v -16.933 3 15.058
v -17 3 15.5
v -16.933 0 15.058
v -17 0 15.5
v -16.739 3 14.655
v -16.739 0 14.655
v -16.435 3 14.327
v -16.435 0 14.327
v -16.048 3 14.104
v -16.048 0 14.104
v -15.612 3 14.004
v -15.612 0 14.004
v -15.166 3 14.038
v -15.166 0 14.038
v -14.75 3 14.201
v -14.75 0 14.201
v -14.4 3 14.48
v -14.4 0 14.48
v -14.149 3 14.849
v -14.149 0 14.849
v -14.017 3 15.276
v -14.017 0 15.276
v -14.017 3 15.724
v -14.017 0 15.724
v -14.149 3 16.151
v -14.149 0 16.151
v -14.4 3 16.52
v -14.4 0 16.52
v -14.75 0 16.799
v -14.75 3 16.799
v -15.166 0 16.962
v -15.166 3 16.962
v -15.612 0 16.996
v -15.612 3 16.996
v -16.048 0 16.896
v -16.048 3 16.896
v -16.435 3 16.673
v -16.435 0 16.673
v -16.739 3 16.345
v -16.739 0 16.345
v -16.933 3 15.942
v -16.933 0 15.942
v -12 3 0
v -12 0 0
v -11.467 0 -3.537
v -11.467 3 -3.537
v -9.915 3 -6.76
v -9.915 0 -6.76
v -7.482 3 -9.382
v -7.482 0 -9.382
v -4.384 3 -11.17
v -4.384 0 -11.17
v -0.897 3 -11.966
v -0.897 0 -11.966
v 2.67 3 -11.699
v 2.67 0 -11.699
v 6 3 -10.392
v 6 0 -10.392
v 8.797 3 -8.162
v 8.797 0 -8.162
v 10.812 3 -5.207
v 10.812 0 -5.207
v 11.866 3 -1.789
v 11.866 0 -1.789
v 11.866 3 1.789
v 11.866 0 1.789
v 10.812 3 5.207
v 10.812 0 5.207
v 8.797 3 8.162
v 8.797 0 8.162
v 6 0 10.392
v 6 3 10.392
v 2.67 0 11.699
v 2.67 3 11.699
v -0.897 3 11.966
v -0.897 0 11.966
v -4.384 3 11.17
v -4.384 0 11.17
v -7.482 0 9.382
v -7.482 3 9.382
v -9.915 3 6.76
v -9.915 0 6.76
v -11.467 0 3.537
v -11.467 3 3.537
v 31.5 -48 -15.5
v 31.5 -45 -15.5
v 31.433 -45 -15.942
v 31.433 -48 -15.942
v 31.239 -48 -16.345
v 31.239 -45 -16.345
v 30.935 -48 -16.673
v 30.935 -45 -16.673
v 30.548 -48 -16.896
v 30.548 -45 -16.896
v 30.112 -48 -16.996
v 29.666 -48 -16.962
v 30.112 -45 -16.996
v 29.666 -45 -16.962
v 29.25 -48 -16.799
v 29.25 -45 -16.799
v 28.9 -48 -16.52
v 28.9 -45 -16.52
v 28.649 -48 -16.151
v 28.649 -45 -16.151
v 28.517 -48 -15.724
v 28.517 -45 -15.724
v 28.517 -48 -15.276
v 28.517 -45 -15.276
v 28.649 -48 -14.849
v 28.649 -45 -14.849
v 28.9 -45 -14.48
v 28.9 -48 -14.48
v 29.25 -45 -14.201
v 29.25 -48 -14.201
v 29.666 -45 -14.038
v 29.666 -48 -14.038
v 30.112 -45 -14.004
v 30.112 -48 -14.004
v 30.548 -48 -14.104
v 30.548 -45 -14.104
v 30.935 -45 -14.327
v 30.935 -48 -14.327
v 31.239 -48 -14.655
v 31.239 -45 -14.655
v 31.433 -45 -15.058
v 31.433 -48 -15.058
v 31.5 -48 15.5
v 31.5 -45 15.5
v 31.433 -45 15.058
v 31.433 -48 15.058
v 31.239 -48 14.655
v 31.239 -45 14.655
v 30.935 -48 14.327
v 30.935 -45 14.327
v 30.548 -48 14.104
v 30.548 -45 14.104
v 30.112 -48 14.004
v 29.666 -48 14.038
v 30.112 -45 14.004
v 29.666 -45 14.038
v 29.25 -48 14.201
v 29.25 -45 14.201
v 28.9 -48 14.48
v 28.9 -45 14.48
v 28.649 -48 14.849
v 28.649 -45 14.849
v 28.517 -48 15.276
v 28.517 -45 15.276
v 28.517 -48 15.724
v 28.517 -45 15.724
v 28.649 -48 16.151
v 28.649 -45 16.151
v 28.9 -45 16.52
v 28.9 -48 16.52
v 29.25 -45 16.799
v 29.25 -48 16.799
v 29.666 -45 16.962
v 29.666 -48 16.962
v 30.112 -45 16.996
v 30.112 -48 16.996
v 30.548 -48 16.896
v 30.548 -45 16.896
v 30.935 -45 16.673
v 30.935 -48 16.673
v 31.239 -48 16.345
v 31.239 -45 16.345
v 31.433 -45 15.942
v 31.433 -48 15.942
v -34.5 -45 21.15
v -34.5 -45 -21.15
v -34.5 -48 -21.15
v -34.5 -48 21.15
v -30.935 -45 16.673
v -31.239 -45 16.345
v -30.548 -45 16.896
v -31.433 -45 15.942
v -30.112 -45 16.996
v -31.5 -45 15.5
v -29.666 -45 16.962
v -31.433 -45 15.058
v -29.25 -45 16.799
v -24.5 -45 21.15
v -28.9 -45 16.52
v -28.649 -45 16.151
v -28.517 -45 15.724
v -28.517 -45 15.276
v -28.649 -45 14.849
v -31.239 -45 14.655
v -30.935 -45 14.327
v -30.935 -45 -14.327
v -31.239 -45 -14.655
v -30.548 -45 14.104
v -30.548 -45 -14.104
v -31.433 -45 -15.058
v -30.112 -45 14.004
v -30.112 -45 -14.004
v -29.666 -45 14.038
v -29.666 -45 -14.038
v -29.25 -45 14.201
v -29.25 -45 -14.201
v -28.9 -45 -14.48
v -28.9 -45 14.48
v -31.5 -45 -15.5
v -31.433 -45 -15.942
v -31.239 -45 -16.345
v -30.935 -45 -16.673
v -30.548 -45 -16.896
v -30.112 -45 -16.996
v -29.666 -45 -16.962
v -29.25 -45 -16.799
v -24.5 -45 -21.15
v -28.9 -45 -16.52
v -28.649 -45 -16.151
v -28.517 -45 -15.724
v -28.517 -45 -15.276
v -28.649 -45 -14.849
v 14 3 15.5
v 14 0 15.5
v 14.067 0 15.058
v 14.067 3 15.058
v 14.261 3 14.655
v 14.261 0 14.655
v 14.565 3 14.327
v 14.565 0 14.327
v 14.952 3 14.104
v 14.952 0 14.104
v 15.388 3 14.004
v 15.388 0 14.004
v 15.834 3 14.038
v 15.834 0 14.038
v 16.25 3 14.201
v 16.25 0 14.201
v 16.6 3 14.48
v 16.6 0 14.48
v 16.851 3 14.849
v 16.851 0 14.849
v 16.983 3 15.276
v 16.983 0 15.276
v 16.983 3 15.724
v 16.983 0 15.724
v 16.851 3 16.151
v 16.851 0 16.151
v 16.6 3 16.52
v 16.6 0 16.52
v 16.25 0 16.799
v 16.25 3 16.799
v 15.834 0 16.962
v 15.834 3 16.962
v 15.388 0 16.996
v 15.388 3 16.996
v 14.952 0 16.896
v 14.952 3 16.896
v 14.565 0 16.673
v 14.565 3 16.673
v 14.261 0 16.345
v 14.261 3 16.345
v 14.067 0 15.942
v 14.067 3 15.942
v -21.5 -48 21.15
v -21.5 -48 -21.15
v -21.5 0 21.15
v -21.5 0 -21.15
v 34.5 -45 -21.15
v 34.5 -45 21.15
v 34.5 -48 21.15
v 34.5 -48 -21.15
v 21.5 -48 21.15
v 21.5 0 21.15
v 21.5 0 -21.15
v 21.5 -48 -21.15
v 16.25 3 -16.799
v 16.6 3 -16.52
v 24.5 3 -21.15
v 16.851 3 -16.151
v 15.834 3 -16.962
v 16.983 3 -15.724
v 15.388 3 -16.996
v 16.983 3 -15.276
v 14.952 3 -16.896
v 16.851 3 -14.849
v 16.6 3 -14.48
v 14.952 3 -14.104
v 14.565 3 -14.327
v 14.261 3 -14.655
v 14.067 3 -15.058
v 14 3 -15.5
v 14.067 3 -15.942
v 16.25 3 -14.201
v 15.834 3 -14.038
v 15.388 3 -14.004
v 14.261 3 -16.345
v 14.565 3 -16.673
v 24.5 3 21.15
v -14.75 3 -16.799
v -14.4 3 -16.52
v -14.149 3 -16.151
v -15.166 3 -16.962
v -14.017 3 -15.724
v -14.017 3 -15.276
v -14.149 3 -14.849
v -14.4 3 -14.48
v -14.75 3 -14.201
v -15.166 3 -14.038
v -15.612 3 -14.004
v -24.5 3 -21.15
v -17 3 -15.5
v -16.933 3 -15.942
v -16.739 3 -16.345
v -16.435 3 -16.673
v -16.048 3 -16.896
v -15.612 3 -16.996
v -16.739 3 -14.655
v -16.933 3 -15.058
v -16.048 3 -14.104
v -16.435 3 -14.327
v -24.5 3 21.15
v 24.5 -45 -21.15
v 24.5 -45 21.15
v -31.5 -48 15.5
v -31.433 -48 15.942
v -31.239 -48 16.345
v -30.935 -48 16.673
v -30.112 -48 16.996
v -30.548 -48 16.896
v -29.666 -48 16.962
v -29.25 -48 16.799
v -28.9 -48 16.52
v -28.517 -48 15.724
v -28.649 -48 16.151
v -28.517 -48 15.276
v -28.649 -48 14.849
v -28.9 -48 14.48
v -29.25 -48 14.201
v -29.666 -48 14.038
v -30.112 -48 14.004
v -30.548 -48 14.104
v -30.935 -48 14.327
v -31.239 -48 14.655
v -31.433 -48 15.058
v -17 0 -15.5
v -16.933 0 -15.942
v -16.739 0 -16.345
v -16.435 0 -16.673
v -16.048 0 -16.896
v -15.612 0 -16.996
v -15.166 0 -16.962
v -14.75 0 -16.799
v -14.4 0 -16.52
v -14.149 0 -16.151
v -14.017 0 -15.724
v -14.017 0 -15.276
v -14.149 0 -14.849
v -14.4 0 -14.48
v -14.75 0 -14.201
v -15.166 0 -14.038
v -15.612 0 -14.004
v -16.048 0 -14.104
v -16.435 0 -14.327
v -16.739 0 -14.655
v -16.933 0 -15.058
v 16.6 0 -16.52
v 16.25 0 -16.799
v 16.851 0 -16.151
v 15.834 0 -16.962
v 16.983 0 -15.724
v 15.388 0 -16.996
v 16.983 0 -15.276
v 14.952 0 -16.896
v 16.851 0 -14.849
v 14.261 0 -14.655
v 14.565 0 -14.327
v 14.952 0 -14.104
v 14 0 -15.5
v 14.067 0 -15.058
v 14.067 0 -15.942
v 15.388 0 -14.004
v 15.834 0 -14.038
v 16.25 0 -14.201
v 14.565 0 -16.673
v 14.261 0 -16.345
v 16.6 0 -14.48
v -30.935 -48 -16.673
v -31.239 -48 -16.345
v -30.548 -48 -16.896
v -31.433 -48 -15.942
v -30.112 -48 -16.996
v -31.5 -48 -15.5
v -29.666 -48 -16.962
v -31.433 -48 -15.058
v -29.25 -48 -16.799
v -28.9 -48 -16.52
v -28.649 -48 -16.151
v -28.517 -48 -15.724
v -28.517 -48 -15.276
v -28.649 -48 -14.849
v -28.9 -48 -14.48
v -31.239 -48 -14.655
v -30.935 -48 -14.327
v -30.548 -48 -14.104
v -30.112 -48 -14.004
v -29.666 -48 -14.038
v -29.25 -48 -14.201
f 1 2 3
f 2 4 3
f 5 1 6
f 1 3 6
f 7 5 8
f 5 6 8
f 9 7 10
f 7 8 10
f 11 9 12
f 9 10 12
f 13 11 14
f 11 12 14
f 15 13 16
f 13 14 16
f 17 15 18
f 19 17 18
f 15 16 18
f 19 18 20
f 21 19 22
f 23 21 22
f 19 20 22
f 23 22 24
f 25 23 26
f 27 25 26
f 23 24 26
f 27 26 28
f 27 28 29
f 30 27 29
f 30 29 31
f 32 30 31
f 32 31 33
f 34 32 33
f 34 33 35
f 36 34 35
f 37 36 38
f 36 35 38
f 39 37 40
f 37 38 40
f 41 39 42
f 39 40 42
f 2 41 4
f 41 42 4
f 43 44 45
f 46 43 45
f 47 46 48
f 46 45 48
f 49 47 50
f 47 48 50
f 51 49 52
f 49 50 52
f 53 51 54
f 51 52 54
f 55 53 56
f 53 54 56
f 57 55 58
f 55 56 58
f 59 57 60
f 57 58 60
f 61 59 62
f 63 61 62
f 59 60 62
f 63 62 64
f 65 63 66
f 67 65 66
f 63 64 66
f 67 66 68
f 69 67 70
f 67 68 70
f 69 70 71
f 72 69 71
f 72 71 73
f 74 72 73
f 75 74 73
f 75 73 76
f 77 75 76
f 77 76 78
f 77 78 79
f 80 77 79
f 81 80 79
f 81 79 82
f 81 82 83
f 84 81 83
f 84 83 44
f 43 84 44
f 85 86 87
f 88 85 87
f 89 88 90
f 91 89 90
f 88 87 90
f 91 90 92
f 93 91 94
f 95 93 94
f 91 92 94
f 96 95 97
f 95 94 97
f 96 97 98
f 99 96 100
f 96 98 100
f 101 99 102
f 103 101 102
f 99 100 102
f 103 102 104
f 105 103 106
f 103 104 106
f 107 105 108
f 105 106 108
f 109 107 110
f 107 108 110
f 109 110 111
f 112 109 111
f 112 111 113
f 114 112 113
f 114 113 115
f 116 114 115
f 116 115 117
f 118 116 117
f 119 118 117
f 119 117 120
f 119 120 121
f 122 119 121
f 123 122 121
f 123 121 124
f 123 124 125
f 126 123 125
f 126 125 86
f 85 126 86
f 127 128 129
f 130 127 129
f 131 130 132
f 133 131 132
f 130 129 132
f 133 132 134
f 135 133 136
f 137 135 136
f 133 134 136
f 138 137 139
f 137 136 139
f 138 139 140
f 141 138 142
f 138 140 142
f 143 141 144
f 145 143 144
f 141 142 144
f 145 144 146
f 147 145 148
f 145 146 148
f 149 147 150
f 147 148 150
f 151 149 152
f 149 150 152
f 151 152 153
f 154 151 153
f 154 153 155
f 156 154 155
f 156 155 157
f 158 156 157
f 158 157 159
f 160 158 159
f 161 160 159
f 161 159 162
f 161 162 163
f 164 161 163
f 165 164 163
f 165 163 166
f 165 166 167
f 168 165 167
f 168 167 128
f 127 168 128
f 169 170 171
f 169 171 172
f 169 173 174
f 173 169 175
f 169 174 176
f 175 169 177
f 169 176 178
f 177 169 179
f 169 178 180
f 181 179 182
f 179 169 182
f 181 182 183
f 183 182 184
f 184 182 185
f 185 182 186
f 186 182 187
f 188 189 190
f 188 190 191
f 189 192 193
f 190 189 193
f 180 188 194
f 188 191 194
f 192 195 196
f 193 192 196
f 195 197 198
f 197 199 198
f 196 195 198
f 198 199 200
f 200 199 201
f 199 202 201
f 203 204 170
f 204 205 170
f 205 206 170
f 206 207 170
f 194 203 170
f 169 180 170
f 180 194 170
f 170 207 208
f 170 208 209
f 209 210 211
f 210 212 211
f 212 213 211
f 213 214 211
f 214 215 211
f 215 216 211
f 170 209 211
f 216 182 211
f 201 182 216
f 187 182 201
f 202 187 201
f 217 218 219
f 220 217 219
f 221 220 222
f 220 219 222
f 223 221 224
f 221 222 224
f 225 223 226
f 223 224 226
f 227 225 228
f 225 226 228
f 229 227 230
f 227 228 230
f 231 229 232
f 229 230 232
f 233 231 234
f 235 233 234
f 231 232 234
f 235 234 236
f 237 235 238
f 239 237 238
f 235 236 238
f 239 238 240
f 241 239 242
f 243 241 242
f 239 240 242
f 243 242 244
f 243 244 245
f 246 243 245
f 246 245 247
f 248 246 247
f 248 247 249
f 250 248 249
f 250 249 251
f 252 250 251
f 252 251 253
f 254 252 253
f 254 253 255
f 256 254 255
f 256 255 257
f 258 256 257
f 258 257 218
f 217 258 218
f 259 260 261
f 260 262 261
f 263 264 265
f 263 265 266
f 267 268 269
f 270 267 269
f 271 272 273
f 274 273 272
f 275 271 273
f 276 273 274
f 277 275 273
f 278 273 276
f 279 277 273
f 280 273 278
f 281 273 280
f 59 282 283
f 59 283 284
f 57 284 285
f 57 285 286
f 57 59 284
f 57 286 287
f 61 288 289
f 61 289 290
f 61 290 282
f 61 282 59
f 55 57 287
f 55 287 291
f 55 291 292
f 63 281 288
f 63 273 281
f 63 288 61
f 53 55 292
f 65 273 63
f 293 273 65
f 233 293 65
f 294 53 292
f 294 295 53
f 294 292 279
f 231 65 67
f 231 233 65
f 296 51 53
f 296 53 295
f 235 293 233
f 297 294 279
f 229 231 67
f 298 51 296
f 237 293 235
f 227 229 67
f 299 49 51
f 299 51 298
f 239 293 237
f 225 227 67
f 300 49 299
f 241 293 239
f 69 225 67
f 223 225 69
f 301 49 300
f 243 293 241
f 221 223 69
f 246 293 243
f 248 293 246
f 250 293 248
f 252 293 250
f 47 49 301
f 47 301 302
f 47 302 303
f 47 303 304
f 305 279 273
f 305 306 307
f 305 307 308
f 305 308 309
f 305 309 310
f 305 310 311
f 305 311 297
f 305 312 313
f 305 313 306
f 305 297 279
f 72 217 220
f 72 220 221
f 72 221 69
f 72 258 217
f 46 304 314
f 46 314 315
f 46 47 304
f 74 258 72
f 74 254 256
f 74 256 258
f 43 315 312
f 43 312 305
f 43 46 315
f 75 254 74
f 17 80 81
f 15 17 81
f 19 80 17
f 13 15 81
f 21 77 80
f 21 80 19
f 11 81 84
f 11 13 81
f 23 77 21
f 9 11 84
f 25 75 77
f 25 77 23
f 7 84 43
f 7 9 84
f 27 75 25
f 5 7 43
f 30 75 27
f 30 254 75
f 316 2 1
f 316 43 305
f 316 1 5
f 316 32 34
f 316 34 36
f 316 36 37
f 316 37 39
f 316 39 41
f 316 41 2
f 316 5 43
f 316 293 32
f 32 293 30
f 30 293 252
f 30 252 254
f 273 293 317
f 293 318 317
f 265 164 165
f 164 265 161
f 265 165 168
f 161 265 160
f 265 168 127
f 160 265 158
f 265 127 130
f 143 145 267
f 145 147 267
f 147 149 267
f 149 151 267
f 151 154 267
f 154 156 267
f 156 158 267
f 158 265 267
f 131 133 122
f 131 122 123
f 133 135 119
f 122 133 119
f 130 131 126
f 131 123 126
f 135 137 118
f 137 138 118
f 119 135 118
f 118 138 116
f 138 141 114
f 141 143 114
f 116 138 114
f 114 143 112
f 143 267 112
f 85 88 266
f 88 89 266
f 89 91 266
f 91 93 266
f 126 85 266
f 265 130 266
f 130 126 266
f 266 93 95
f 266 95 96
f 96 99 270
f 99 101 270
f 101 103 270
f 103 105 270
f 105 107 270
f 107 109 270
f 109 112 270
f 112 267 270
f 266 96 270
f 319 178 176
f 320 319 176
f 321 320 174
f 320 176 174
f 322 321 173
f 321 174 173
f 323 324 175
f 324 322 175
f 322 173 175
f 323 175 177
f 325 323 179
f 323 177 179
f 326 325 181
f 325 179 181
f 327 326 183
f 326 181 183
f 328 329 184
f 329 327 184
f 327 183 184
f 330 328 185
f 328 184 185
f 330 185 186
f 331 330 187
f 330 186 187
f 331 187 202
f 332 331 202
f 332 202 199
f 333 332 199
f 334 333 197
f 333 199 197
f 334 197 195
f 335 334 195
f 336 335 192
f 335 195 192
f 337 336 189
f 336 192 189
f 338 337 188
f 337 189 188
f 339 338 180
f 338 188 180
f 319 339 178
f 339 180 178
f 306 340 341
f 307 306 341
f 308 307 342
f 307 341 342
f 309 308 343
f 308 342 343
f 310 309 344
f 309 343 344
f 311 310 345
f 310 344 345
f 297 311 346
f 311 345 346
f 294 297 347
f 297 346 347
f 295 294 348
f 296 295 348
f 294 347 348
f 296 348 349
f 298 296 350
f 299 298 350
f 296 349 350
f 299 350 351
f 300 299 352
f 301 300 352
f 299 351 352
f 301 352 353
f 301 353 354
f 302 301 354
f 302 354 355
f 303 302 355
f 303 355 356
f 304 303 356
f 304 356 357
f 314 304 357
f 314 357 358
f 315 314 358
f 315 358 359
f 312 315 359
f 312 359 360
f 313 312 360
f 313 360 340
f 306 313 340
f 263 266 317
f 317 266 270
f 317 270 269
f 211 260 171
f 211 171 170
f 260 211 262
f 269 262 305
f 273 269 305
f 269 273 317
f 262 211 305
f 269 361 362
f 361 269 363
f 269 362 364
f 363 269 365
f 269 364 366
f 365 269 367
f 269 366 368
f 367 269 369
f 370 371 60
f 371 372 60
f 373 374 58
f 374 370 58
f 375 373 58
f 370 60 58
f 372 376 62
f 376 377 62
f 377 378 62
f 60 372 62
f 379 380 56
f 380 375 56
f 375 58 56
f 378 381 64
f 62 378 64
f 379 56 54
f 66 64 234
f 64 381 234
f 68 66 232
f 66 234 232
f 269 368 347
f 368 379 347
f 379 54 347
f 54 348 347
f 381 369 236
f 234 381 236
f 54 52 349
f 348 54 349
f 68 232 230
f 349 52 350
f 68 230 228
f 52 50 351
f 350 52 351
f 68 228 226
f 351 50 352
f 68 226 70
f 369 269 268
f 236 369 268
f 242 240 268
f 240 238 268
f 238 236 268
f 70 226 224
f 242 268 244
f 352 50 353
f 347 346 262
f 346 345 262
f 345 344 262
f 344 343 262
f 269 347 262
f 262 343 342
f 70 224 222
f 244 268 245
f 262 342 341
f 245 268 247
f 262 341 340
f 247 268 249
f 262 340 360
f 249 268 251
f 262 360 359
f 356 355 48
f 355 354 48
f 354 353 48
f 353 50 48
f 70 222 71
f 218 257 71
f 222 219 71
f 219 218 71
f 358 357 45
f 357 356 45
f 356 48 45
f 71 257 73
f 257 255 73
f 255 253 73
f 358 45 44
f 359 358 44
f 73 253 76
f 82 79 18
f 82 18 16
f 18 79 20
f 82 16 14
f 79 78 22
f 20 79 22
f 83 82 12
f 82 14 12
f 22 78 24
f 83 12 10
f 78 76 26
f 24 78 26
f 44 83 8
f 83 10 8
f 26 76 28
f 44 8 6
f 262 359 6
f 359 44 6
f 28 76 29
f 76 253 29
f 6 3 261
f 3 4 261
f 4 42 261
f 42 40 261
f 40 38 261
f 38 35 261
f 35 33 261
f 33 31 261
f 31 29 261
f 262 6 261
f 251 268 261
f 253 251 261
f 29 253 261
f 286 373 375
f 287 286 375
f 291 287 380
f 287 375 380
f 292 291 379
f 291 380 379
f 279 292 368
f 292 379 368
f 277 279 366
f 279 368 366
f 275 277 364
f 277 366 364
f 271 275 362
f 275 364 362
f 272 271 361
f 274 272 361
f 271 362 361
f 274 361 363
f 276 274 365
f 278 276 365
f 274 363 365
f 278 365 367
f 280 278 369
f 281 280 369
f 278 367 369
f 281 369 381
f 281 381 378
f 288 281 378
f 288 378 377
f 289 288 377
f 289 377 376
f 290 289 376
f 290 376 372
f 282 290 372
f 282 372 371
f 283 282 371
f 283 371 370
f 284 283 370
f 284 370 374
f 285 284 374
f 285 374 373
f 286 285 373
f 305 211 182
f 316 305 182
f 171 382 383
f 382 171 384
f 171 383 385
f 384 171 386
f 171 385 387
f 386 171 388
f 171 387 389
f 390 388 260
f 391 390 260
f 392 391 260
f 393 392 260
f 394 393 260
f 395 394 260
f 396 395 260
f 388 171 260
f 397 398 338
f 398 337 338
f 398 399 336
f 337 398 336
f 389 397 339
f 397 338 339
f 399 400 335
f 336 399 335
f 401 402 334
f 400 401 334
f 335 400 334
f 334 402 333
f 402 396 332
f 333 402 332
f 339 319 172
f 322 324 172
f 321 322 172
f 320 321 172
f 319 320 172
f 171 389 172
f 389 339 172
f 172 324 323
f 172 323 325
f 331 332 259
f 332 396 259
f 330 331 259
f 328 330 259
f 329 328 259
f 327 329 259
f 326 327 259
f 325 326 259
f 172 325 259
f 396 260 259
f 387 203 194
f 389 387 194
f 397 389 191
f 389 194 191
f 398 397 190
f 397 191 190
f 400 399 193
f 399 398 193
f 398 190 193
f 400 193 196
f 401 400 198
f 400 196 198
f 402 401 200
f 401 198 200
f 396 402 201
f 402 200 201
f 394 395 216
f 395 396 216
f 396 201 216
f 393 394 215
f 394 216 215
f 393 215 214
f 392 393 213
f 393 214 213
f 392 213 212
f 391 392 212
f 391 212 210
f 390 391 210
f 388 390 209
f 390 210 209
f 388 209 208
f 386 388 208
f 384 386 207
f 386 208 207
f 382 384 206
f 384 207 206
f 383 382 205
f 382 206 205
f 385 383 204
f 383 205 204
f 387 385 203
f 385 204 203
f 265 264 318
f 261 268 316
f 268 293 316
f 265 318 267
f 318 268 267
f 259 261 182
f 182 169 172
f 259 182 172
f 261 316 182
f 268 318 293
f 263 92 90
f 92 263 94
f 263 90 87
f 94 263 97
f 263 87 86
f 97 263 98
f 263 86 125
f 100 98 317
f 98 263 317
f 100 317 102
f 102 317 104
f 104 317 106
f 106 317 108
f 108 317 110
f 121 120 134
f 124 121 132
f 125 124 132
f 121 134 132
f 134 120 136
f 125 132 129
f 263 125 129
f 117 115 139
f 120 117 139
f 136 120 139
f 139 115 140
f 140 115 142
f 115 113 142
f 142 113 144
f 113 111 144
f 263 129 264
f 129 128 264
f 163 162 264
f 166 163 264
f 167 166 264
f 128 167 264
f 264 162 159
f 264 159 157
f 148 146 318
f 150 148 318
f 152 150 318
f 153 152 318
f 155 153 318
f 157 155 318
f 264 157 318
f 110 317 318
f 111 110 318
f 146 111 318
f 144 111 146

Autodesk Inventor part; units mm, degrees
ref_plane "YZ Plane" through (0, 0, 0) normal (1, 0, 0) x (0, 1, 0)
ref_plane "XZ Plane" through (0, 0, 0) normal (0, 1, 0) x (-1, 0, 0)
ref_plane "XY Plane" through (0, 0, 0) normal (0, 0, 1) x (1, 0, 0)
sketch "Sketch1" plane through (0, 0, 0) normal (0, 1, 0) x (-1, 0, 0)
  line L0 (24.5, 21.15) -> (-24.5, 21.15)
  line L1 (-24.5, 21.15) -> (-24.5, -21.15)
  line L2 (-24.5, -21.15) -> (24.5, -21.15)
  line L3 (24.5, -21.15) -> (24.5, 21.15)
  line L4 (24.5, 21.15) -> (-24.5, -21.15) construction
  line L5 (-24.5, 21.15) -> (24.5, -21.15) construction
  circle A0 centre (0, 0) radius 12
  circle A1 centre (15.5, -15.5) radius 1.5
  line L6 (0, 0) -> (0, -30.8544) construction
  line L7 (0, 0) -> (-33.5596, 0) construction
  circle A2 centre (15.5, 15.5) radius 1.5
  circle A3 centre (-15.5, -15.5) radius 1.5
  circle A4 centre (-15.5, 15.5) radius 1.5
  dimension "d0" = 49
  dimension "d1" = 42.3
  dimension "d2" = 24
  dimension "d3" = 15.5
  dimension "d4" = 3
  dimension "d5" = 15.5
  dimension "d8" = 31
  dimension "d11" = 31
extrude "Extrusion1" add sketch "Sketch1" along normal blind 3
sketch "Sketch2" plane through (0, 0, 0) normal (0, -1, 0) x (1, 0, 0)
  line L0 (-24.5, 21.15) -> (24.5, 21.15) projected
  line L1 (24.5, -21.15) -> (-24.5, -21.15) projected
  line L2 (24.5, 21.15) -> (21.5, 21.15)
  line L3 (21.5, 21.15) -> (21.5, -21.15)
  line L4 (21.5, -21.15) -> (24.5, -21.15)
  line L5 (24.5, -21.15) -> (24.5, 21.15)
  point P0 (0, 0)
  dimension "d16" = 3
extrude "Extrusion2" add sketch "Sketch2" along normal blind 48
sketch "Sketch3" plane through (24.5, 3, 21.15) normal (1, 0, 0) x (0, 0, -1)
  line L0 (0, -51) -> (42.3, -51) projected
  line L1 (0, -51) -> (42.3, -51)
  line L2 (42.3, -51) -> (42.3, -48)
  line L3 (42.3, -48) -> (0, -48)
  line L4 (0, -48) -> (0, -51)
  point P0 (21.15, -3)
  dimension "d19" = 3
extrude "Extrusion3" add sketch "Sketch3" along normal blind 10
sketch "Sketch4" plane through (24.5, -45, 21.15) normal (0, 1, 0) x (1, 0, 0)
  circle A0 centre (5.5, 36.65) radius 1.5
  circle A1 centre (-9, 36.65) radius 1.5 projected
  line L0 (-24.5, 21.15) -> (15.0504, 21.15) construction
  circle A2 centre (5.5, 5.65) radius 1.5
  dimension "d22" = 3
  dimension "d23" = 30
extrude "Extrusion4" cut sketch "Sketch4" against normal through all contours A0 | A2
mirror "Mirror1" about plane through (0, 0, 0) normal (1, 0, 0)
equation "\"d5\" = d3"
properties part number "Motor_cage_3DPrint"
